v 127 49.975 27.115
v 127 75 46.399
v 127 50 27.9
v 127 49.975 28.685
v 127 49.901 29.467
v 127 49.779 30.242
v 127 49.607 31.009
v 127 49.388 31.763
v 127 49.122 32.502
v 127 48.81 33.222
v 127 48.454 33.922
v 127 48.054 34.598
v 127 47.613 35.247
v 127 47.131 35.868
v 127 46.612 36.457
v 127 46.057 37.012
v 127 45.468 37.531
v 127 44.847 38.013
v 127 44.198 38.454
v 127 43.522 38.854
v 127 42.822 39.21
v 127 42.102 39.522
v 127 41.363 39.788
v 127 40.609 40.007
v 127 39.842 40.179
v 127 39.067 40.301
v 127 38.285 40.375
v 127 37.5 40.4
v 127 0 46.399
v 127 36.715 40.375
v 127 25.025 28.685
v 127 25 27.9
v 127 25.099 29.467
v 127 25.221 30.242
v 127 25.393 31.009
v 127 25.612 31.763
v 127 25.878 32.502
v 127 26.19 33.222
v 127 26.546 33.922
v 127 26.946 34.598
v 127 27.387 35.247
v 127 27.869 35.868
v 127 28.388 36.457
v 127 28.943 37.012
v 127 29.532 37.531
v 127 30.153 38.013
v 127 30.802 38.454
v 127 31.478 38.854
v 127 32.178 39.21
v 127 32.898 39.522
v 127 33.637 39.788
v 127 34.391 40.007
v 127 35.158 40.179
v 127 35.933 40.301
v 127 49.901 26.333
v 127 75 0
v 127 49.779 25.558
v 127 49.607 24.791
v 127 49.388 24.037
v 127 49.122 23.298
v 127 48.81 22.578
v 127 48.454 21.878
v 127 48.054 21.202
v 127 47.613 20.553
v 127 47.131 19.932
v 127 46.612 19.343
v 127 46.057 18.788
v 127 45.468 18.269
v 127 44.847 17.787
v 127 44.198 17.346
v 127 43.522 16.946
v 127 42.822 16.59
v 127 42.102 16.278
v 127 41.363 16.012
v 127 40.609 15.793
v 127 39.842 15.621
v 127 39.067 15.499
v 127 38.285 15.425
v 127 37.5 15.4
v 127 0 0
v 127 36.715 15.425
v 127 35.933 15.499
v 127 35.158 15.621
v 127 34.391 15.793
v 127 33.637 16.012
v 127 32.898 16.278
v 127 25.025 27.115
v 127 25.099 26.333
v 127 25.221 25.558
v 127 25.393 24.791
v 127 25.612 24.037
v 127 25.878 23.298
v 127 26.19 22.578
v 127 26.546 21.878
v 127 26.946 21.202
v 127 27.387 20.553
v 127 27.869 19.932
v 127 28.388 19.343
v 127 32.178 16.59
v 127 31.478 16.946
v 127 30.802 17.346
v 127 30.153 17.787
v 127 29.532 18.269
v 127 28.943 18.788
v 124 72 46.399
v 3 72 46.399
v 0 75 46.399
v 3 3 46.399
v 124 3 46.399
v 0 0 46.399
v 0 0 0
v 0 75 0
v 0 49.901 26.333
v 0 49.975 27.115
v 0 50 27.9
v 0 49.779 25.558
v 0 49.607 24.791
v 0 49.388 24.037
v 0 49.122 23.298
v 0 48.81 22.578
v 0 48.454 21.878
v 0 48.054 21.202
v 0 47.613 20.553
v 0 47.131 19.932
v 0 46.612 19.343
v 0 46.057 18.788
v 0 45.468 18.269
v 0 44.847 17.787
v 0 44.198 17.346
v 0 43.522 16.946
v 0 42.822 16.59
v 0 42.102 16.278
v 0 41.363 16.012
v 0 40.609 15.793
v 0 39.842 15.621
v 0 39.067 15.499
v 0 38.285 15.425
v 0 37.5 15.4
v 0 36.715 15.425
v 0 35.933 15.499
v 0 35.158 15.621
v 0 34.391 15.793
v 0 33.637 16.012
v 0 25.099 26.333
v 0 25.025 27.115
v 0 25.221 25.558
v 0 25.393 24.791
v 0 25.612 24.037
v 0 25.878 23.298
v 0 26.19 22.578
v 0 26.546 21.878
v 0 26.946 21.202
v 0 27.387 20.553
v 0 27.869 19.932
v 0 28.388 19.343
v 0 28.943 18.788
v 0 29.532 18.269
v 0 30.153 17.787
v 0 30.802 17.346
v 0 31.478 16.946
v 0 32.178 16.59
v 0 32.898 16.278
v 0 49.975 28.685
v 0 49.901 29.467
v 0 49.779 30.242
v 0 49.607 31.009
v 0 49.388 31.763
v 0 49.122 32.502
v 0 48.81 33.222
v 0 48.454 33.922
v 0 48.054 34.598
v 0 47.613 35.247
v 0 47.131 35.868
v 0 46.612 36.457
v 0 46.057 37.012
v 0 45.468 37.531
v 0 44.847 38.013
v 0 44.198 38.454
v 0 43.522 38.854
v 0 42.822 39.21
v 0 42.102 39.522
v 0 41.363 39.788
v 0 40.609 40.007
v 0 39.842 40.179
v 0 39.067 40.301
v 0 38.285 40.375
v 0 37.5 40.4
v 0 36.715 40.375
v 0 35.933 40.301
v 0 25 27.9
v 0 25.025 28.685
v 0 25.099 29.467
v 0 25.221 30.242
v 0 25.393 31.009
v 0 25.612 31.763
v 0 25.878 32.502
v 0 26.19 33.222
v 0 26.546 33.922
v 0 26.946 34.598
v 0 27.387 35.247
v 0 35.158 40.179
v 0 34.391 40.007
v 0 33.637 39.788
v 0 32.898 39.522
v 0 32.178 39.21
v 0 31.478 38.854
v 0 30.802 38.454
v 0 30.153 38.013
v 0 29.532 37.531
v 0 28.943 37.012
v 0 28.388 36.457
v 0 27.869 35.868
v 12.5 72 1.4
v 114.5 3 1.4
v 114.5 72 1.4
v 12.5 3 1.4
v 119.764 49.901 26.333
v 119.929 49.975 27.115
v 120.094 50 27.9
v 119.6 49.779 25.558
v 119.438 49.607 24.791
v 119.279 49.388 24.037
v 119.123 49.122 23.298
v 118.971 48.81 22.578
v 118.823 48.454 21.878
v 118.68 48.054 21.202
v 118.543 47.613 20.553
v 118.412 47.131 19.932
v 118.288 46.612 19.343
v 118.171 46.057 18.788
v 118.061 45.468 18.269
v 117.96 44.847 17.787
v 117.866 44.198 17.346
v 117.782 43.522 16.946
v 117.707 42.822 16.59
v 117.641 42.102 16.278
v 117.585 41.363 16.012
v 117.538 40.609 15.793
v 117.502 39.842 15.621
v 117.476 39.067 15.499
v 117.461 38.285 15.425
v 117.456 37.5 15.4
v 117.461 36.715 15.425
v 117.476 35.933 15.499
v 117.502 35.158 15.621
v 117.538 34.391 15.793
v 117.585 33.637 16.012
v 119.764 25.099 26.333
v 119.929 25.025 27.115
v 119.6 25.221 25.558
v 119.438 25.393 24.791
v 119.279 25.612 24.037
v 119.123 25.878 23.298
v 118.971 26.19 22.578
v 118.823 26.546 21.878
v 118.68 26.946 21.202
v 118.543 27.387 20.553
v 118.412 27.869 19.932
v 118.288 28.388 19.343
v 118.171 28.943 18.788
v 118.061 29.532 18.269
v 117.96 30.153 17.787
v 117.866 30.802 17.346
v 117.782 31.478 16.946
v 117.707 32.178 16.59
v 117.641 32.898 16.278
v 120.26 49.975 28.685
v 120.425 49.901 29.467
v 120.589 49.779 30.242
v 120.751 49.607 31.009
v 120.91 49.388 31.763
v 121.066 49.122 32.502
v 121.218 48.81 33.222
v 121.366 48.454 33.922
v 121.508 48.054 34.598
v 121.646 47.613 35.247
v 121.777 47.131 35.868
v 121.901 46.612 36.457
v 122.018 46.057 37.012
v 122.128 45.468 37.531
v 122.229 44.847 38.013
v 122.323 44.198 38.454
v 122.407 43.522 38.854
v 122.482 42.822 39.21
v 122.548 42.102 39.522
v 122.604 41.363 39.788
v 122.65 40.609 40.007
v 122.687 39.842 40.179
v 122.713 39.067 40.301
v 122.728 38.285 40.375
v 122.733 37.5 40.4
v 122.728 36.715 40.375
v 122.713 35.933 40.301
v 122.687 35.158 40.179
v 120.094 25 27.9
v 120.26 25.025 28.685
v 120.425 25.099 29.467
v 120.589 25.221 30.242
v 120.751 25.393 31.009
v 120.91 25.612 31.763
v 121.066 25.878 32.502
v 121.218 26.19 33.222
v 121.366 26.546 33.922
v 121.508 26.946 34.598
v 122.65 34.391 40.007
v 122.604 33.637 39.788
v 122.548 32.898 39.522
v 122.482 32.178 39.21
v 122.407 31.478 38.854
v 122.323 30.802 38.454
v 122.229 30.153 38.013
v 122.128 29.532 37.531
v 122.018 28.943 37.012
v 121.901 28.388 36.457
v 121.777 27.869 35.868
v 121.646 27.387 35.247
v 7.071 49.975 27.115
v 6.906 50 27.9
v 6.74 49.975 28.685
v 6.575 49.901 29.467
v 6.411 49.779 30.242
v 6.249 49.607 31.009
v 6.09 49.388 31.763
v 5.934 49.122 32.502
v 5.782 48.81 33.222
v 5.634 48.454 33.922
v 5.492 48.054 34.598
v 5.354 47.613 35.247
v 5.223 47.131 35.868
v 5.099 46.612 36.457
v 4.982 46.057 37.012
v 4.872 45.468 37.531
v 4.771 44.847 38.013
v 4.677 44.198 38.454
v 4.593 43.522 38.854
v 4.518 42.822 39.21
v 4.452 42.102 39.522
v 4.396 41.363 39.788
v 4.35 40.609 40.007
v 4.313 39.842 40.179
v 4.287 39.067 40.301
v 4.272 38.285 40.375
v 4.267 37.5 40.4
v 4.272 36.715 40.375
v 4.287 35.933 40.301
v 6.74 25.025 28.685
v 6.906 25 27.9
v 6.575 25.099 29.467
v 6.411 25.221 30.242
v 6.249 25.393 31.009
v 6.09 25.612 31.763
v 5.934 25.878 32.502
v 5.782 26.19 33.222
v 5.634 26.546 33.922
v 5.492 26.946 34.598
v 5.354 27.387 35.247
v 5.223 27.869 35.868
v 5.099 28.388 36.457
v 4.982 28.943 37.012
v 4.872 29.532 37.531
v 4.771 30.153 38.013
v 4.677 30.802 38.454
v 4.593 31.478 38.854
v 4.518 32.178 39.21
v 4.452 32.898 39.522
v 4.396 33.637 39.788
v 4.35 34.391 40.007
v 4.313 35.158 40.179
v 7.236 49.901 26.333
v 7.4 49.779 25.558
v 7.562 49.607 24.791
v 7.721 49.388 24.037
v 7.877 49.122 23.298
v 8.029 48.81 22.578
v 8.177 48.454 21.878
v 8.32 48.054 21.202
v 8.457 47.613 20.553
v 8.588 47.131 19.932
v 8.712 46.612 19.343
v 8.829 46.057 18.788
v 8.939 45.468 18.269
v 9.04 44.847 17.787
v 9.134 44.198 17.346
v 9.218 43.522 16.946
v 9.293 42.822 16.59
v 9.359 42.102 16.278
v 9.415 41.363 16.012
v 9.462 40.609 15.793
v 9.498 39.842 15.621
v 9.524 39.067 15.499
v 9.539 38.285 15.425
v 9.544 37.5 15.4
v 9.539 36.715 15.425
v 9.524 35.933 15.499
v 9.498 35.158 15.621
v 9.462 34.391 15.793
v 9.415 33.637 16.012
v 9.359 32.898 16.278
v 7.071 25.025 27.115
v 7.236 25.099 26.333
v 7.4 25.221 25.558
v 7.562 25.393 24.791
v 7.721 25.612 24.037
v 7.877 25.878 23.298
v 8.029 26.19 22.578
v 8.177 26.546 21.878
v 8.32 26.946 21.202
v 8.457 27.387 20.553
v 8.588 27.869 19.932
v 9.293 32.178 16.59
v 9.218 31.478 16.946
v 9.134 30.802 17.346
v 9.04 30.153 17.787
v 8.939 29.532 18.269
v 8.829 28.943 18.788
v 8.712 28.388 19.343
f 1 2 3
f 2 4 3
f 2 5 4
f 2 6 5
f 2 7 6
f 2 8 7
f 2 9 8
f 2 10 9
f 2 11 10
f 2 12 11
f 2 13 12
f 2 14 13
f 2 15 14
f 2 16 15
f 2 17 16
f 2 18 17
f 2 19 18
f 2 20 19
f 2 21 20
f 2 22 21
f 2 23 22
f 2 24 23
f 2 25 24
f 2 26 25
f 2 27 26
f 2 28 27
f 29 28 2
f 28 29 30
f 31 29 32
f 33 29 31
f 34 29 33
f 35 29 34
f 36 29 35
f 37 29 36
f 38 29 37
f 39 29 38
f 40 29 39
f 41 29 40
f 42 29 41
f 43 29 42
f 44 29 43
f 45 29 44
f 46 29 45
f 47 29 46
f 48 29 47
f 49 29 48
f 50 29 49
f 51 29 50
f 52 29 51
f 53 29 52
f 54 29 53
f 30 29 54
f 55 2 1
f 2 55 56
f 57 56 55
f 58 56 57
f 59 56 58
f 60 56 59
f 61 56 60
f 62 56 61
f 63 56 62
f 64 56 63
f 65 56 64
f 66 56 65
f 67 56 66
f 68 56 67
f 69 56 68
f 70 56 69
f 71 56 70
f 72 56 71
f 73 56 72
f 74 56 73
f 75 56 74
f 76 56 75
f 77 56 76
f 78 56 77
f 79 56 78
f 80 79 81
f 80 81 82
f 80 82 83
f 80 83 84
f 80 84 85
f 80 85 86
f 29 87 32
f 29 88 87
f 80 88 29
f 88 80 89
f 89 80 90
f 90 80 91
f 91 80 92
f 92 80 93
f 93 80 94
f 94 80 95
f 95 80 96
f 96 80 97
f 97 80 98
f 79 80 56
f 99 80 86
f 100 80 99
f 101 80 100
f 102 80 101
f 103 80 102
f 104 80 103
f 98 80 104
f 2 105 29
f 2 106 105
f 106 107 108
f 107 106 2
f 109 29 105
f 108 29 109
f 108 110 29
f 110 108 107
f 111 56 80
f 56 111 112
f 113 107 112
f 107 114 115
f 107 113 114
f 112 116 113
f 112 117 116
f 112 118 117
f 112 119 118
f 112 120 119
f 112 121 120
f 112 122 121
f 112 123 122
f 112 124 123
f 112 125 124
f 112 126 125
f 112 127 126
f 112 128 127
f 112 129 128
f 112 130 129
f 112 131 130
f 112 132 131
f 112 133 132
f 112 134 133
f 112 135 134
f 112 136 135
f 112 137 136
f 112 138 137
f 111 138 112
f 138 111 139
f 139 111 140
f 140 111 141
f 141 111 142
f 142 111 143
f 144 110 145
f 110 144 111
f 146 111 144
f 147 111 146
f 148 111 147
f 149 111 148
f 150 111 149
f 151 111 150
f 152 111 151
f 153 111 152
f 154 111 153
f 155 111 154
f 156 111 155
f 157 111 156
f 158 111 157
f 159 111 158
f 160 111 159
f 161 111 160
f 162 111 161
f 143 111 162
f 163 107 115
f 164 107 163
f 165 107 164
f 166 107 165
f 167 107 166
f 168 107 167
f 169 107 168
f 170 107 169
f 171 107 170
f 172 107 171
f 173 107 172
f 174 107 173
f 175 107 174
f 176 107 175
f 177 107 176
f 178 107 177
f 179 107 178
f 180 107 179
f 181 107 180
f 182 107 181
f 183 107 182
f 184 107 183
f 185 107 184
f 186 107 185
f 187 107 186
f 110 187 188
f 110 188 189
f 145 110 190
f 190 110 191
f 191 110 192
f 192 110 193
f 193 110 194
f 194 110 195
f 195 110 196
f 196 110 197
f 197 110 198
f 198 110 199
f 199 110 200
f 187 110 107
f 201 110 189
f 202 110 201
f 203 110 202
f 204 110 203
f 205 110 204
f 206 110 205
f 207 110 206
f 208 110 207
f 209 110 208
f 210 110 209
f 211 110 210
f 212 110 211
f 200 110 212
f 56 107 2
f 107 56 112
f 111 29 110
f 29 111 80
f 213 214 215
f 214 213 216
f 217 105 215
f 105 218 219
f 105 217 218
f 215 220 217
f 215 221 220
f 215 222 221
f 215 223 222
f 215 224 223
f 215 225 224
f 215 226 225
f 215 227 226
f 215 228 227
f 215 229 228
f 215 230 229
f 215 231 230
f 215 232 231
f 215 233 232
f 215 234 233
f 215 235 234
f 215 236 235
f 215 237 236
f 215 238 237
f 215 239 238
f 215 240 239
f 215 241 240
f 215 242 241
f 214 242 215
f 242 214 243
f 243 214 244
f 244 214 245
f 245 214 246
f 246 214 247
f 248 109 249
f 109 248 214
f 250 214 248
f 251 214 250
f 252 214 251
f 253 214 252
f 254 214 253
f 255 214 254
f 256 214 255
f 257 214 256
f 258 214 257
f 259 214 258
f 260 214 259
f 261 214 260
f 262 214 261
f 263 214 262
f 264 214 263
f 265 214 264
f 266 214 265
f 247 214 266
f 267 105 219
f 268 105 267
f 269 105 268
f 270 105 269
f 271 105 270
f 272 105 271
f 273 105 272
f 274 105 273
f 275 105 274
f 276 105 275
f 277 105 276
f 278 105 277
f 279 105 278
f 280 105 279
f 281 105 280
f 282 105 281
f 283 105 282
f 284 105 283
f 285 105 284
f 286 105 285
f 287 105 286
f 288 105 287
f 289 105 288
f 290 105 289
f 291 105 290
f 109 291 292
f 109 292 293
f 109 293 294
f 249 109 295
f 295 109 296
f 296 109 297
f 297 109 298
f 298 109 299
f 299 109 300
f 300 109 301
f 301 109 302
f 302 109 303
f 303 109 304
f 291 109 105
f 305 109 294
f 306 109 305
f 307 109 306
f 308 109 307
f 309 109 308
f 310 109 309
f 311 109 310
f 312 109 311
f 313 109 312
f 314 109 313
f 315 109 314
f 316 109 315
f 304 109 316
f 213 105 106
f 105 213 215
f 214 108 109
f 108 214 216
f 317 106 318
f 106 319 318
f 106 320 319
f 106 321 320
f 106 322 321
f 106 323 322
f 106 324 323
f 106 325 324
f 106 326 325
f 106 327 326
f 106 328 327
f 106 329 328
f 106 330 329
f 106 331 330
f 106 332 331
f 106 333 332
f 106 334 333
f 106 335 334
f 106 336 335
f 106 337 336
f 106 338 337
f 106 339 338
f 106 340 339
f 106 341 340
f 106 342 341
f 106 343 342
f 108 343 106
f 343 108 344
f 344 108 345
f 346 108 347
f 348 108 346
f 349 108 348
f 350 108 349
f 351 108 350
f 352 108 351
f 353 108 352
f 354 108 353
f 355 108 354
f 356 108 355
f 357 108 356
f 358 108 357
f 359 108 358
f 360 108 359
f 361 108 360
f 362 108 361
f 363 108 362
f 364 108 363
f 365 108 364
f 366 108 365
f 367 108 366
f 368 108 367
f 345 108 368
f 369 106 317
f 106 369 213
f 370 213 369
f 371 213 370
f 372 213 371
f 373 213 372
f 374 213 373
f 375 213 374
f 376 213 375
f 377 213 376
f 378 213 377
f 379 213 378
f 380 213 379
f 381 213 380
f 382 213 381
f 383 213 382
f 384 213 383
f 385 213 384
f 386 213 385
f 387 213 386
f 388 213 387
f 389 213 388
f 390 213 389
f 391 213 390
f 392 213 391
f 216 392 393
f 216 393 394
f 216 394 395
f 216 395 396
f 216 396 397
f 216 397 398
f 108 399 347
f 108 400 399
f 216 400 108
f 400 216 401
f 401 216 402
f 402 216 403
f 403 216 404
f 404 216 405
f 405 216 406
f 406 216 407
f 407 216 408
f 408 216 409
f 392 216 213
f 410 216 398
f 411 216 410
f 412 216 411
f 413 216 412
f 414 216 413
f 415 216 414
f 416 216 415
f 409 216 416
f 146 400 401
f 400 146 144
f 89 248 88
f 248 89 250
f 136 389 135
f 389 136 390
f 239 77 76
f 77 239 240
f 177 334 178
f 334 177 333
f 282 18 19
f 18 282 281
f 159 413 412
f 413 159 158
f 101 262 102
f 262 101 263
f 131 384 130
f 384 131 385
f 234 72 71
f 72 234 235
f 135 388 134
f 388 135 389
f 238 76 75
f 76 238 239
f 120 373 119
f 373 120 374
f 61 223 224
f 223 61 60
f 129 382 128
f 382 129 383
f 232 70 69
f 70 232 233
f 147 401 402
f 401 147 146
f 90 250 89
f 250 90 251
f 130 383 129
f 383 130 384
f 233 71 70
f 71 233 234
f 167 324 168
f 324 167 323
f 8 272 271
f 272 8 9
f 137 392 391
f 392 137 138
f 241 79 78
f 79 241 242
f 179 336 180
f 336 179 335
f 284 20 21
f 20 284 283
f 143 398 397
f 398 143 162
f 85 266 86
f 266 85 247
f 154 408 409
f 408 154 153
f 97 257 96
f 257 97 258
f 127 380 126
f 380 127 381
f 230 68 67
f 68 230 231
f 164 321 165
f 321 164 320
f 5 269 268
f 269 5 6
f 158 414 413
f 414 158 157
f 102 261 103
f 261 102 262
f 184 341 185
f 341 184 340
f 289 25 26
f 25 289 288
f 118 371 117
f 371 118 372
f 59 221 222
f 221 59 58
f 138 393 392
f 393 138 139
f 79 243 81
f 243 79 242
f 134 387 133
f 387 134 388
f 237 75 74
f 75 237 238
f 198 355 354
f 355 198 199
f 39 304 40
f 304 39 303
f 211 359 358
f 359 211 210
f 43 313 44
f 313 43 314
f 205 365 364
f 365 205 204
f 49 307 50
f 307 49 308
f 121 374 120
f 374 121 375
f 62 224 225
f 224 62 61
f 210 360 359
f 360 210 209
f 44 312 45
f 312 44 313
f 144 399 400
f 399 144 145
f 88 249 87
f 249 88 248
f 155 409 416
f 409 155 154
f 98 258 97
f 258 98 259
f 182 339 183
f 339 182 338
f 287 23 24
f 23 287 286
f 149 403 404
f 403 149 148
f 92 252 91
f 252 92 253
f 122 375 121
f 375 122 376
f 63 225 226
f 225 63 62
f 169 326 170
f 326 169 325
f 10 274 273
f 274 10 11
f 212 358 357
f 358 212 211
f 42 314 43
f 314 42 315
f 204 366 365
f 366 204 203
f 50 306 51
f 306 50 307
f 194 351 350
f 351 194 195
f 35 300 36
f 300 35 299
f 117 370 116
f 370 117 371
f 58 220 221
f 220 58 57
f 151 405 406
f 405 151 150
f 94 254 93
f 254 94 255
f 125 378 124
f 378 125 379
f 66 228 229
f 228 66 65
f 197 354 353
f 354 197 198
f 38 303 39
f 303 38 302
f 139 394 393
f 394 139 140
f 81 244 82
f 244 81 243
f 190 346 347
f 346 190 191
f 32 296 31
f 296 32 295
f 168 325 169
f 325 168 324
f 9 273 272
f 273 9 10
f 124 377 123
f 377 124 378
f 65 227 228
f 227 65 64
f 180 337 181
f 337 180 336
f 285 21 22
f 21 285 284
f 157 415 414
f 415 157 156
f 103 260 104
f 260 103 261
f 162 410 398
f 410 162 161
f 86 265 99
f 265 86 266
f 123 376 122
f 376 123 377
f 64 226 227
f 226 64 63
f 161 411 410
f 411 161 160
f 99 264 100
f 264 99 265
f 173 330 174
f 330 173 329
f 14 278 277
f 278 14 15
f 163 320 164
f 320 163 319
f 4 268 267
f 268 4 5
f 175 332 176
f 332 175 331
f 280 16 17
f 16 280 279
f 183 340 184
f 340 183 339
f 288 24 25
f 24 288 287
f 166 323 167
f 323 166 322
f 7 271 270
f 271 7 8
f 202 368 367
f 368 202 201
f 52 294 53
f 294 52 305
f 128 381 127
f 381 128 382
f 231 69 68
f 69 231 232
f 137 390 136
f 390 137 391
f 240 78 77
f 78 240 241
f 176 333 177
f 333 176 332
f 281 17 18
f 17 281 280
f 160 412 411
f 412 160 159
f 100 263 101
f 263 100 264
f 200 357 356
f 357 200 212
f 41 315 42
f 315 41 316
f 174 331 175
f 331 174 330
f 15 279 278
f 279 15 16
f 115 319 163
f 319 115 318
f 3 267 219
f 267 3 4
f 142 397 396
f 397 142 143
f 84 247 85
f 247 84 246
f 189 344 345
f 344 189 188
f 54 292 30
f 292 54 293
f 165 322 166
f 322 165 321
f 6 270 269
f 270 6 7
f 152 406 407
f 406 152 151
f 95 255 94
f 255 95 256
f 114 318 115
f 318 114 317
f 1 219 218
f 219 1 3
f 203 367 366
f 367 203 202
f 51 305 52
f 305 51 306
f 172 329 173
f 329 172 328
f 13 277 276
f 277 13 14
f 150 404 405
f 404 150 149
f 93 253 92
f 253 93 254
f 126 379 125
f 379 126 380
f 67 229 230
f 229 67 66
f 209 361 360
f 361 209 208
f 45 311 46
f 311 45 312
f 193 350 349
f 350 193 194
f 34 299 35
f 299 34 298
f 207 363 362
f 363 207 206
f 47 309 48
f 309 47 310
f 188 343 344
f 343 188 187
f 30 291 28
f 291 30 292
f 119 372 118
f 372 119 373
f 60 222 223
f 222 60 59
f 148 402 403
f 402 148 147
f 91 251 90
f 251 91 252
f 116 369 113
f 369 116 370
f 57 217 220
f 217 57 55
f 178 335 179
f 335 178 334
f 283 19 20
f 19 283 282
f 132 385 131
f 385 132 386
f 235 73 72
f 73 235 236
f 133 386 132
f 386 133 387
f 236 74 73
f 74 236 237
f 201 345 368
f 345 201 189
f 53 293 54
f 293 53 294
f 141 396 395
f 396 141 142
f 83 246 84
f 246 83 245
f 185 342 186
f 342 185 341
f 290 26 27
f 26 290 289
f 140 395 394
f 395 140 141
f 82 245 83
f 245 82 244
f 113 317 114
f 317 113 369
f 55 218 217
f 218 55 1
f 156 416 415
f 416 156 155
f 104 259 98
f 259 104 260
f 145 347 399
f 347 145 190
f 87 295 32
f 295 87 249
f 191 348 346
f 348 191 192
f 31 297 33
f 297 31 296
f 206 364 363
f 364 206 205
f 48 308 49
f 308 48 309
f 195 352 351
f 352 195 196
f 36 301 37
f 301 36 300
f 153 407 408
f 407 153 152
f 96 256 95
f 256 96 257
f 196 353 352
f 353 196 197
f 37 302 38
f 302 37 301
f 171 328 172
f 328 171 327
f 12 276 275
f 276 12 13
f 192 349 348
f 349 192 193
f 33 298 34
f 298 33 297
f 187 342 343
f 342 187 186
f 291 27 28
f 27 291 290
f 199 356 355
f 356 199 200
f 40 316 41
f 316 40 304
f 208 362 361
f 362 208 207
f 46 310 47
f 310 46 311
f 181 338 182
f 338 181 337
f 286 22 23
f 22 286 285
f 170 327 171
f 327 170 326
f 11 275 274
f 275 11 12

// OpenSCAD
FLOOR = 1.4;
FINGER_DIA = 25;

INNER_H = 45;

$fn = 100;

difference() {
    cube([127, 75, INNER_H+FLOOR-0.001]);
    translate([3, 72, FLOOR]) rotate([90,0,0]) linear_extrude(height=69) polygon([[0,45],[9.5,0],[111.5,0],[121,45]]);
    translate([-0.001, 75/2, INNER_H+FLOOR-6-FINGER_DIA/2]) rotate([0, 90, 0]) cylinder(d=FINGER_DIA, h=130);
}
